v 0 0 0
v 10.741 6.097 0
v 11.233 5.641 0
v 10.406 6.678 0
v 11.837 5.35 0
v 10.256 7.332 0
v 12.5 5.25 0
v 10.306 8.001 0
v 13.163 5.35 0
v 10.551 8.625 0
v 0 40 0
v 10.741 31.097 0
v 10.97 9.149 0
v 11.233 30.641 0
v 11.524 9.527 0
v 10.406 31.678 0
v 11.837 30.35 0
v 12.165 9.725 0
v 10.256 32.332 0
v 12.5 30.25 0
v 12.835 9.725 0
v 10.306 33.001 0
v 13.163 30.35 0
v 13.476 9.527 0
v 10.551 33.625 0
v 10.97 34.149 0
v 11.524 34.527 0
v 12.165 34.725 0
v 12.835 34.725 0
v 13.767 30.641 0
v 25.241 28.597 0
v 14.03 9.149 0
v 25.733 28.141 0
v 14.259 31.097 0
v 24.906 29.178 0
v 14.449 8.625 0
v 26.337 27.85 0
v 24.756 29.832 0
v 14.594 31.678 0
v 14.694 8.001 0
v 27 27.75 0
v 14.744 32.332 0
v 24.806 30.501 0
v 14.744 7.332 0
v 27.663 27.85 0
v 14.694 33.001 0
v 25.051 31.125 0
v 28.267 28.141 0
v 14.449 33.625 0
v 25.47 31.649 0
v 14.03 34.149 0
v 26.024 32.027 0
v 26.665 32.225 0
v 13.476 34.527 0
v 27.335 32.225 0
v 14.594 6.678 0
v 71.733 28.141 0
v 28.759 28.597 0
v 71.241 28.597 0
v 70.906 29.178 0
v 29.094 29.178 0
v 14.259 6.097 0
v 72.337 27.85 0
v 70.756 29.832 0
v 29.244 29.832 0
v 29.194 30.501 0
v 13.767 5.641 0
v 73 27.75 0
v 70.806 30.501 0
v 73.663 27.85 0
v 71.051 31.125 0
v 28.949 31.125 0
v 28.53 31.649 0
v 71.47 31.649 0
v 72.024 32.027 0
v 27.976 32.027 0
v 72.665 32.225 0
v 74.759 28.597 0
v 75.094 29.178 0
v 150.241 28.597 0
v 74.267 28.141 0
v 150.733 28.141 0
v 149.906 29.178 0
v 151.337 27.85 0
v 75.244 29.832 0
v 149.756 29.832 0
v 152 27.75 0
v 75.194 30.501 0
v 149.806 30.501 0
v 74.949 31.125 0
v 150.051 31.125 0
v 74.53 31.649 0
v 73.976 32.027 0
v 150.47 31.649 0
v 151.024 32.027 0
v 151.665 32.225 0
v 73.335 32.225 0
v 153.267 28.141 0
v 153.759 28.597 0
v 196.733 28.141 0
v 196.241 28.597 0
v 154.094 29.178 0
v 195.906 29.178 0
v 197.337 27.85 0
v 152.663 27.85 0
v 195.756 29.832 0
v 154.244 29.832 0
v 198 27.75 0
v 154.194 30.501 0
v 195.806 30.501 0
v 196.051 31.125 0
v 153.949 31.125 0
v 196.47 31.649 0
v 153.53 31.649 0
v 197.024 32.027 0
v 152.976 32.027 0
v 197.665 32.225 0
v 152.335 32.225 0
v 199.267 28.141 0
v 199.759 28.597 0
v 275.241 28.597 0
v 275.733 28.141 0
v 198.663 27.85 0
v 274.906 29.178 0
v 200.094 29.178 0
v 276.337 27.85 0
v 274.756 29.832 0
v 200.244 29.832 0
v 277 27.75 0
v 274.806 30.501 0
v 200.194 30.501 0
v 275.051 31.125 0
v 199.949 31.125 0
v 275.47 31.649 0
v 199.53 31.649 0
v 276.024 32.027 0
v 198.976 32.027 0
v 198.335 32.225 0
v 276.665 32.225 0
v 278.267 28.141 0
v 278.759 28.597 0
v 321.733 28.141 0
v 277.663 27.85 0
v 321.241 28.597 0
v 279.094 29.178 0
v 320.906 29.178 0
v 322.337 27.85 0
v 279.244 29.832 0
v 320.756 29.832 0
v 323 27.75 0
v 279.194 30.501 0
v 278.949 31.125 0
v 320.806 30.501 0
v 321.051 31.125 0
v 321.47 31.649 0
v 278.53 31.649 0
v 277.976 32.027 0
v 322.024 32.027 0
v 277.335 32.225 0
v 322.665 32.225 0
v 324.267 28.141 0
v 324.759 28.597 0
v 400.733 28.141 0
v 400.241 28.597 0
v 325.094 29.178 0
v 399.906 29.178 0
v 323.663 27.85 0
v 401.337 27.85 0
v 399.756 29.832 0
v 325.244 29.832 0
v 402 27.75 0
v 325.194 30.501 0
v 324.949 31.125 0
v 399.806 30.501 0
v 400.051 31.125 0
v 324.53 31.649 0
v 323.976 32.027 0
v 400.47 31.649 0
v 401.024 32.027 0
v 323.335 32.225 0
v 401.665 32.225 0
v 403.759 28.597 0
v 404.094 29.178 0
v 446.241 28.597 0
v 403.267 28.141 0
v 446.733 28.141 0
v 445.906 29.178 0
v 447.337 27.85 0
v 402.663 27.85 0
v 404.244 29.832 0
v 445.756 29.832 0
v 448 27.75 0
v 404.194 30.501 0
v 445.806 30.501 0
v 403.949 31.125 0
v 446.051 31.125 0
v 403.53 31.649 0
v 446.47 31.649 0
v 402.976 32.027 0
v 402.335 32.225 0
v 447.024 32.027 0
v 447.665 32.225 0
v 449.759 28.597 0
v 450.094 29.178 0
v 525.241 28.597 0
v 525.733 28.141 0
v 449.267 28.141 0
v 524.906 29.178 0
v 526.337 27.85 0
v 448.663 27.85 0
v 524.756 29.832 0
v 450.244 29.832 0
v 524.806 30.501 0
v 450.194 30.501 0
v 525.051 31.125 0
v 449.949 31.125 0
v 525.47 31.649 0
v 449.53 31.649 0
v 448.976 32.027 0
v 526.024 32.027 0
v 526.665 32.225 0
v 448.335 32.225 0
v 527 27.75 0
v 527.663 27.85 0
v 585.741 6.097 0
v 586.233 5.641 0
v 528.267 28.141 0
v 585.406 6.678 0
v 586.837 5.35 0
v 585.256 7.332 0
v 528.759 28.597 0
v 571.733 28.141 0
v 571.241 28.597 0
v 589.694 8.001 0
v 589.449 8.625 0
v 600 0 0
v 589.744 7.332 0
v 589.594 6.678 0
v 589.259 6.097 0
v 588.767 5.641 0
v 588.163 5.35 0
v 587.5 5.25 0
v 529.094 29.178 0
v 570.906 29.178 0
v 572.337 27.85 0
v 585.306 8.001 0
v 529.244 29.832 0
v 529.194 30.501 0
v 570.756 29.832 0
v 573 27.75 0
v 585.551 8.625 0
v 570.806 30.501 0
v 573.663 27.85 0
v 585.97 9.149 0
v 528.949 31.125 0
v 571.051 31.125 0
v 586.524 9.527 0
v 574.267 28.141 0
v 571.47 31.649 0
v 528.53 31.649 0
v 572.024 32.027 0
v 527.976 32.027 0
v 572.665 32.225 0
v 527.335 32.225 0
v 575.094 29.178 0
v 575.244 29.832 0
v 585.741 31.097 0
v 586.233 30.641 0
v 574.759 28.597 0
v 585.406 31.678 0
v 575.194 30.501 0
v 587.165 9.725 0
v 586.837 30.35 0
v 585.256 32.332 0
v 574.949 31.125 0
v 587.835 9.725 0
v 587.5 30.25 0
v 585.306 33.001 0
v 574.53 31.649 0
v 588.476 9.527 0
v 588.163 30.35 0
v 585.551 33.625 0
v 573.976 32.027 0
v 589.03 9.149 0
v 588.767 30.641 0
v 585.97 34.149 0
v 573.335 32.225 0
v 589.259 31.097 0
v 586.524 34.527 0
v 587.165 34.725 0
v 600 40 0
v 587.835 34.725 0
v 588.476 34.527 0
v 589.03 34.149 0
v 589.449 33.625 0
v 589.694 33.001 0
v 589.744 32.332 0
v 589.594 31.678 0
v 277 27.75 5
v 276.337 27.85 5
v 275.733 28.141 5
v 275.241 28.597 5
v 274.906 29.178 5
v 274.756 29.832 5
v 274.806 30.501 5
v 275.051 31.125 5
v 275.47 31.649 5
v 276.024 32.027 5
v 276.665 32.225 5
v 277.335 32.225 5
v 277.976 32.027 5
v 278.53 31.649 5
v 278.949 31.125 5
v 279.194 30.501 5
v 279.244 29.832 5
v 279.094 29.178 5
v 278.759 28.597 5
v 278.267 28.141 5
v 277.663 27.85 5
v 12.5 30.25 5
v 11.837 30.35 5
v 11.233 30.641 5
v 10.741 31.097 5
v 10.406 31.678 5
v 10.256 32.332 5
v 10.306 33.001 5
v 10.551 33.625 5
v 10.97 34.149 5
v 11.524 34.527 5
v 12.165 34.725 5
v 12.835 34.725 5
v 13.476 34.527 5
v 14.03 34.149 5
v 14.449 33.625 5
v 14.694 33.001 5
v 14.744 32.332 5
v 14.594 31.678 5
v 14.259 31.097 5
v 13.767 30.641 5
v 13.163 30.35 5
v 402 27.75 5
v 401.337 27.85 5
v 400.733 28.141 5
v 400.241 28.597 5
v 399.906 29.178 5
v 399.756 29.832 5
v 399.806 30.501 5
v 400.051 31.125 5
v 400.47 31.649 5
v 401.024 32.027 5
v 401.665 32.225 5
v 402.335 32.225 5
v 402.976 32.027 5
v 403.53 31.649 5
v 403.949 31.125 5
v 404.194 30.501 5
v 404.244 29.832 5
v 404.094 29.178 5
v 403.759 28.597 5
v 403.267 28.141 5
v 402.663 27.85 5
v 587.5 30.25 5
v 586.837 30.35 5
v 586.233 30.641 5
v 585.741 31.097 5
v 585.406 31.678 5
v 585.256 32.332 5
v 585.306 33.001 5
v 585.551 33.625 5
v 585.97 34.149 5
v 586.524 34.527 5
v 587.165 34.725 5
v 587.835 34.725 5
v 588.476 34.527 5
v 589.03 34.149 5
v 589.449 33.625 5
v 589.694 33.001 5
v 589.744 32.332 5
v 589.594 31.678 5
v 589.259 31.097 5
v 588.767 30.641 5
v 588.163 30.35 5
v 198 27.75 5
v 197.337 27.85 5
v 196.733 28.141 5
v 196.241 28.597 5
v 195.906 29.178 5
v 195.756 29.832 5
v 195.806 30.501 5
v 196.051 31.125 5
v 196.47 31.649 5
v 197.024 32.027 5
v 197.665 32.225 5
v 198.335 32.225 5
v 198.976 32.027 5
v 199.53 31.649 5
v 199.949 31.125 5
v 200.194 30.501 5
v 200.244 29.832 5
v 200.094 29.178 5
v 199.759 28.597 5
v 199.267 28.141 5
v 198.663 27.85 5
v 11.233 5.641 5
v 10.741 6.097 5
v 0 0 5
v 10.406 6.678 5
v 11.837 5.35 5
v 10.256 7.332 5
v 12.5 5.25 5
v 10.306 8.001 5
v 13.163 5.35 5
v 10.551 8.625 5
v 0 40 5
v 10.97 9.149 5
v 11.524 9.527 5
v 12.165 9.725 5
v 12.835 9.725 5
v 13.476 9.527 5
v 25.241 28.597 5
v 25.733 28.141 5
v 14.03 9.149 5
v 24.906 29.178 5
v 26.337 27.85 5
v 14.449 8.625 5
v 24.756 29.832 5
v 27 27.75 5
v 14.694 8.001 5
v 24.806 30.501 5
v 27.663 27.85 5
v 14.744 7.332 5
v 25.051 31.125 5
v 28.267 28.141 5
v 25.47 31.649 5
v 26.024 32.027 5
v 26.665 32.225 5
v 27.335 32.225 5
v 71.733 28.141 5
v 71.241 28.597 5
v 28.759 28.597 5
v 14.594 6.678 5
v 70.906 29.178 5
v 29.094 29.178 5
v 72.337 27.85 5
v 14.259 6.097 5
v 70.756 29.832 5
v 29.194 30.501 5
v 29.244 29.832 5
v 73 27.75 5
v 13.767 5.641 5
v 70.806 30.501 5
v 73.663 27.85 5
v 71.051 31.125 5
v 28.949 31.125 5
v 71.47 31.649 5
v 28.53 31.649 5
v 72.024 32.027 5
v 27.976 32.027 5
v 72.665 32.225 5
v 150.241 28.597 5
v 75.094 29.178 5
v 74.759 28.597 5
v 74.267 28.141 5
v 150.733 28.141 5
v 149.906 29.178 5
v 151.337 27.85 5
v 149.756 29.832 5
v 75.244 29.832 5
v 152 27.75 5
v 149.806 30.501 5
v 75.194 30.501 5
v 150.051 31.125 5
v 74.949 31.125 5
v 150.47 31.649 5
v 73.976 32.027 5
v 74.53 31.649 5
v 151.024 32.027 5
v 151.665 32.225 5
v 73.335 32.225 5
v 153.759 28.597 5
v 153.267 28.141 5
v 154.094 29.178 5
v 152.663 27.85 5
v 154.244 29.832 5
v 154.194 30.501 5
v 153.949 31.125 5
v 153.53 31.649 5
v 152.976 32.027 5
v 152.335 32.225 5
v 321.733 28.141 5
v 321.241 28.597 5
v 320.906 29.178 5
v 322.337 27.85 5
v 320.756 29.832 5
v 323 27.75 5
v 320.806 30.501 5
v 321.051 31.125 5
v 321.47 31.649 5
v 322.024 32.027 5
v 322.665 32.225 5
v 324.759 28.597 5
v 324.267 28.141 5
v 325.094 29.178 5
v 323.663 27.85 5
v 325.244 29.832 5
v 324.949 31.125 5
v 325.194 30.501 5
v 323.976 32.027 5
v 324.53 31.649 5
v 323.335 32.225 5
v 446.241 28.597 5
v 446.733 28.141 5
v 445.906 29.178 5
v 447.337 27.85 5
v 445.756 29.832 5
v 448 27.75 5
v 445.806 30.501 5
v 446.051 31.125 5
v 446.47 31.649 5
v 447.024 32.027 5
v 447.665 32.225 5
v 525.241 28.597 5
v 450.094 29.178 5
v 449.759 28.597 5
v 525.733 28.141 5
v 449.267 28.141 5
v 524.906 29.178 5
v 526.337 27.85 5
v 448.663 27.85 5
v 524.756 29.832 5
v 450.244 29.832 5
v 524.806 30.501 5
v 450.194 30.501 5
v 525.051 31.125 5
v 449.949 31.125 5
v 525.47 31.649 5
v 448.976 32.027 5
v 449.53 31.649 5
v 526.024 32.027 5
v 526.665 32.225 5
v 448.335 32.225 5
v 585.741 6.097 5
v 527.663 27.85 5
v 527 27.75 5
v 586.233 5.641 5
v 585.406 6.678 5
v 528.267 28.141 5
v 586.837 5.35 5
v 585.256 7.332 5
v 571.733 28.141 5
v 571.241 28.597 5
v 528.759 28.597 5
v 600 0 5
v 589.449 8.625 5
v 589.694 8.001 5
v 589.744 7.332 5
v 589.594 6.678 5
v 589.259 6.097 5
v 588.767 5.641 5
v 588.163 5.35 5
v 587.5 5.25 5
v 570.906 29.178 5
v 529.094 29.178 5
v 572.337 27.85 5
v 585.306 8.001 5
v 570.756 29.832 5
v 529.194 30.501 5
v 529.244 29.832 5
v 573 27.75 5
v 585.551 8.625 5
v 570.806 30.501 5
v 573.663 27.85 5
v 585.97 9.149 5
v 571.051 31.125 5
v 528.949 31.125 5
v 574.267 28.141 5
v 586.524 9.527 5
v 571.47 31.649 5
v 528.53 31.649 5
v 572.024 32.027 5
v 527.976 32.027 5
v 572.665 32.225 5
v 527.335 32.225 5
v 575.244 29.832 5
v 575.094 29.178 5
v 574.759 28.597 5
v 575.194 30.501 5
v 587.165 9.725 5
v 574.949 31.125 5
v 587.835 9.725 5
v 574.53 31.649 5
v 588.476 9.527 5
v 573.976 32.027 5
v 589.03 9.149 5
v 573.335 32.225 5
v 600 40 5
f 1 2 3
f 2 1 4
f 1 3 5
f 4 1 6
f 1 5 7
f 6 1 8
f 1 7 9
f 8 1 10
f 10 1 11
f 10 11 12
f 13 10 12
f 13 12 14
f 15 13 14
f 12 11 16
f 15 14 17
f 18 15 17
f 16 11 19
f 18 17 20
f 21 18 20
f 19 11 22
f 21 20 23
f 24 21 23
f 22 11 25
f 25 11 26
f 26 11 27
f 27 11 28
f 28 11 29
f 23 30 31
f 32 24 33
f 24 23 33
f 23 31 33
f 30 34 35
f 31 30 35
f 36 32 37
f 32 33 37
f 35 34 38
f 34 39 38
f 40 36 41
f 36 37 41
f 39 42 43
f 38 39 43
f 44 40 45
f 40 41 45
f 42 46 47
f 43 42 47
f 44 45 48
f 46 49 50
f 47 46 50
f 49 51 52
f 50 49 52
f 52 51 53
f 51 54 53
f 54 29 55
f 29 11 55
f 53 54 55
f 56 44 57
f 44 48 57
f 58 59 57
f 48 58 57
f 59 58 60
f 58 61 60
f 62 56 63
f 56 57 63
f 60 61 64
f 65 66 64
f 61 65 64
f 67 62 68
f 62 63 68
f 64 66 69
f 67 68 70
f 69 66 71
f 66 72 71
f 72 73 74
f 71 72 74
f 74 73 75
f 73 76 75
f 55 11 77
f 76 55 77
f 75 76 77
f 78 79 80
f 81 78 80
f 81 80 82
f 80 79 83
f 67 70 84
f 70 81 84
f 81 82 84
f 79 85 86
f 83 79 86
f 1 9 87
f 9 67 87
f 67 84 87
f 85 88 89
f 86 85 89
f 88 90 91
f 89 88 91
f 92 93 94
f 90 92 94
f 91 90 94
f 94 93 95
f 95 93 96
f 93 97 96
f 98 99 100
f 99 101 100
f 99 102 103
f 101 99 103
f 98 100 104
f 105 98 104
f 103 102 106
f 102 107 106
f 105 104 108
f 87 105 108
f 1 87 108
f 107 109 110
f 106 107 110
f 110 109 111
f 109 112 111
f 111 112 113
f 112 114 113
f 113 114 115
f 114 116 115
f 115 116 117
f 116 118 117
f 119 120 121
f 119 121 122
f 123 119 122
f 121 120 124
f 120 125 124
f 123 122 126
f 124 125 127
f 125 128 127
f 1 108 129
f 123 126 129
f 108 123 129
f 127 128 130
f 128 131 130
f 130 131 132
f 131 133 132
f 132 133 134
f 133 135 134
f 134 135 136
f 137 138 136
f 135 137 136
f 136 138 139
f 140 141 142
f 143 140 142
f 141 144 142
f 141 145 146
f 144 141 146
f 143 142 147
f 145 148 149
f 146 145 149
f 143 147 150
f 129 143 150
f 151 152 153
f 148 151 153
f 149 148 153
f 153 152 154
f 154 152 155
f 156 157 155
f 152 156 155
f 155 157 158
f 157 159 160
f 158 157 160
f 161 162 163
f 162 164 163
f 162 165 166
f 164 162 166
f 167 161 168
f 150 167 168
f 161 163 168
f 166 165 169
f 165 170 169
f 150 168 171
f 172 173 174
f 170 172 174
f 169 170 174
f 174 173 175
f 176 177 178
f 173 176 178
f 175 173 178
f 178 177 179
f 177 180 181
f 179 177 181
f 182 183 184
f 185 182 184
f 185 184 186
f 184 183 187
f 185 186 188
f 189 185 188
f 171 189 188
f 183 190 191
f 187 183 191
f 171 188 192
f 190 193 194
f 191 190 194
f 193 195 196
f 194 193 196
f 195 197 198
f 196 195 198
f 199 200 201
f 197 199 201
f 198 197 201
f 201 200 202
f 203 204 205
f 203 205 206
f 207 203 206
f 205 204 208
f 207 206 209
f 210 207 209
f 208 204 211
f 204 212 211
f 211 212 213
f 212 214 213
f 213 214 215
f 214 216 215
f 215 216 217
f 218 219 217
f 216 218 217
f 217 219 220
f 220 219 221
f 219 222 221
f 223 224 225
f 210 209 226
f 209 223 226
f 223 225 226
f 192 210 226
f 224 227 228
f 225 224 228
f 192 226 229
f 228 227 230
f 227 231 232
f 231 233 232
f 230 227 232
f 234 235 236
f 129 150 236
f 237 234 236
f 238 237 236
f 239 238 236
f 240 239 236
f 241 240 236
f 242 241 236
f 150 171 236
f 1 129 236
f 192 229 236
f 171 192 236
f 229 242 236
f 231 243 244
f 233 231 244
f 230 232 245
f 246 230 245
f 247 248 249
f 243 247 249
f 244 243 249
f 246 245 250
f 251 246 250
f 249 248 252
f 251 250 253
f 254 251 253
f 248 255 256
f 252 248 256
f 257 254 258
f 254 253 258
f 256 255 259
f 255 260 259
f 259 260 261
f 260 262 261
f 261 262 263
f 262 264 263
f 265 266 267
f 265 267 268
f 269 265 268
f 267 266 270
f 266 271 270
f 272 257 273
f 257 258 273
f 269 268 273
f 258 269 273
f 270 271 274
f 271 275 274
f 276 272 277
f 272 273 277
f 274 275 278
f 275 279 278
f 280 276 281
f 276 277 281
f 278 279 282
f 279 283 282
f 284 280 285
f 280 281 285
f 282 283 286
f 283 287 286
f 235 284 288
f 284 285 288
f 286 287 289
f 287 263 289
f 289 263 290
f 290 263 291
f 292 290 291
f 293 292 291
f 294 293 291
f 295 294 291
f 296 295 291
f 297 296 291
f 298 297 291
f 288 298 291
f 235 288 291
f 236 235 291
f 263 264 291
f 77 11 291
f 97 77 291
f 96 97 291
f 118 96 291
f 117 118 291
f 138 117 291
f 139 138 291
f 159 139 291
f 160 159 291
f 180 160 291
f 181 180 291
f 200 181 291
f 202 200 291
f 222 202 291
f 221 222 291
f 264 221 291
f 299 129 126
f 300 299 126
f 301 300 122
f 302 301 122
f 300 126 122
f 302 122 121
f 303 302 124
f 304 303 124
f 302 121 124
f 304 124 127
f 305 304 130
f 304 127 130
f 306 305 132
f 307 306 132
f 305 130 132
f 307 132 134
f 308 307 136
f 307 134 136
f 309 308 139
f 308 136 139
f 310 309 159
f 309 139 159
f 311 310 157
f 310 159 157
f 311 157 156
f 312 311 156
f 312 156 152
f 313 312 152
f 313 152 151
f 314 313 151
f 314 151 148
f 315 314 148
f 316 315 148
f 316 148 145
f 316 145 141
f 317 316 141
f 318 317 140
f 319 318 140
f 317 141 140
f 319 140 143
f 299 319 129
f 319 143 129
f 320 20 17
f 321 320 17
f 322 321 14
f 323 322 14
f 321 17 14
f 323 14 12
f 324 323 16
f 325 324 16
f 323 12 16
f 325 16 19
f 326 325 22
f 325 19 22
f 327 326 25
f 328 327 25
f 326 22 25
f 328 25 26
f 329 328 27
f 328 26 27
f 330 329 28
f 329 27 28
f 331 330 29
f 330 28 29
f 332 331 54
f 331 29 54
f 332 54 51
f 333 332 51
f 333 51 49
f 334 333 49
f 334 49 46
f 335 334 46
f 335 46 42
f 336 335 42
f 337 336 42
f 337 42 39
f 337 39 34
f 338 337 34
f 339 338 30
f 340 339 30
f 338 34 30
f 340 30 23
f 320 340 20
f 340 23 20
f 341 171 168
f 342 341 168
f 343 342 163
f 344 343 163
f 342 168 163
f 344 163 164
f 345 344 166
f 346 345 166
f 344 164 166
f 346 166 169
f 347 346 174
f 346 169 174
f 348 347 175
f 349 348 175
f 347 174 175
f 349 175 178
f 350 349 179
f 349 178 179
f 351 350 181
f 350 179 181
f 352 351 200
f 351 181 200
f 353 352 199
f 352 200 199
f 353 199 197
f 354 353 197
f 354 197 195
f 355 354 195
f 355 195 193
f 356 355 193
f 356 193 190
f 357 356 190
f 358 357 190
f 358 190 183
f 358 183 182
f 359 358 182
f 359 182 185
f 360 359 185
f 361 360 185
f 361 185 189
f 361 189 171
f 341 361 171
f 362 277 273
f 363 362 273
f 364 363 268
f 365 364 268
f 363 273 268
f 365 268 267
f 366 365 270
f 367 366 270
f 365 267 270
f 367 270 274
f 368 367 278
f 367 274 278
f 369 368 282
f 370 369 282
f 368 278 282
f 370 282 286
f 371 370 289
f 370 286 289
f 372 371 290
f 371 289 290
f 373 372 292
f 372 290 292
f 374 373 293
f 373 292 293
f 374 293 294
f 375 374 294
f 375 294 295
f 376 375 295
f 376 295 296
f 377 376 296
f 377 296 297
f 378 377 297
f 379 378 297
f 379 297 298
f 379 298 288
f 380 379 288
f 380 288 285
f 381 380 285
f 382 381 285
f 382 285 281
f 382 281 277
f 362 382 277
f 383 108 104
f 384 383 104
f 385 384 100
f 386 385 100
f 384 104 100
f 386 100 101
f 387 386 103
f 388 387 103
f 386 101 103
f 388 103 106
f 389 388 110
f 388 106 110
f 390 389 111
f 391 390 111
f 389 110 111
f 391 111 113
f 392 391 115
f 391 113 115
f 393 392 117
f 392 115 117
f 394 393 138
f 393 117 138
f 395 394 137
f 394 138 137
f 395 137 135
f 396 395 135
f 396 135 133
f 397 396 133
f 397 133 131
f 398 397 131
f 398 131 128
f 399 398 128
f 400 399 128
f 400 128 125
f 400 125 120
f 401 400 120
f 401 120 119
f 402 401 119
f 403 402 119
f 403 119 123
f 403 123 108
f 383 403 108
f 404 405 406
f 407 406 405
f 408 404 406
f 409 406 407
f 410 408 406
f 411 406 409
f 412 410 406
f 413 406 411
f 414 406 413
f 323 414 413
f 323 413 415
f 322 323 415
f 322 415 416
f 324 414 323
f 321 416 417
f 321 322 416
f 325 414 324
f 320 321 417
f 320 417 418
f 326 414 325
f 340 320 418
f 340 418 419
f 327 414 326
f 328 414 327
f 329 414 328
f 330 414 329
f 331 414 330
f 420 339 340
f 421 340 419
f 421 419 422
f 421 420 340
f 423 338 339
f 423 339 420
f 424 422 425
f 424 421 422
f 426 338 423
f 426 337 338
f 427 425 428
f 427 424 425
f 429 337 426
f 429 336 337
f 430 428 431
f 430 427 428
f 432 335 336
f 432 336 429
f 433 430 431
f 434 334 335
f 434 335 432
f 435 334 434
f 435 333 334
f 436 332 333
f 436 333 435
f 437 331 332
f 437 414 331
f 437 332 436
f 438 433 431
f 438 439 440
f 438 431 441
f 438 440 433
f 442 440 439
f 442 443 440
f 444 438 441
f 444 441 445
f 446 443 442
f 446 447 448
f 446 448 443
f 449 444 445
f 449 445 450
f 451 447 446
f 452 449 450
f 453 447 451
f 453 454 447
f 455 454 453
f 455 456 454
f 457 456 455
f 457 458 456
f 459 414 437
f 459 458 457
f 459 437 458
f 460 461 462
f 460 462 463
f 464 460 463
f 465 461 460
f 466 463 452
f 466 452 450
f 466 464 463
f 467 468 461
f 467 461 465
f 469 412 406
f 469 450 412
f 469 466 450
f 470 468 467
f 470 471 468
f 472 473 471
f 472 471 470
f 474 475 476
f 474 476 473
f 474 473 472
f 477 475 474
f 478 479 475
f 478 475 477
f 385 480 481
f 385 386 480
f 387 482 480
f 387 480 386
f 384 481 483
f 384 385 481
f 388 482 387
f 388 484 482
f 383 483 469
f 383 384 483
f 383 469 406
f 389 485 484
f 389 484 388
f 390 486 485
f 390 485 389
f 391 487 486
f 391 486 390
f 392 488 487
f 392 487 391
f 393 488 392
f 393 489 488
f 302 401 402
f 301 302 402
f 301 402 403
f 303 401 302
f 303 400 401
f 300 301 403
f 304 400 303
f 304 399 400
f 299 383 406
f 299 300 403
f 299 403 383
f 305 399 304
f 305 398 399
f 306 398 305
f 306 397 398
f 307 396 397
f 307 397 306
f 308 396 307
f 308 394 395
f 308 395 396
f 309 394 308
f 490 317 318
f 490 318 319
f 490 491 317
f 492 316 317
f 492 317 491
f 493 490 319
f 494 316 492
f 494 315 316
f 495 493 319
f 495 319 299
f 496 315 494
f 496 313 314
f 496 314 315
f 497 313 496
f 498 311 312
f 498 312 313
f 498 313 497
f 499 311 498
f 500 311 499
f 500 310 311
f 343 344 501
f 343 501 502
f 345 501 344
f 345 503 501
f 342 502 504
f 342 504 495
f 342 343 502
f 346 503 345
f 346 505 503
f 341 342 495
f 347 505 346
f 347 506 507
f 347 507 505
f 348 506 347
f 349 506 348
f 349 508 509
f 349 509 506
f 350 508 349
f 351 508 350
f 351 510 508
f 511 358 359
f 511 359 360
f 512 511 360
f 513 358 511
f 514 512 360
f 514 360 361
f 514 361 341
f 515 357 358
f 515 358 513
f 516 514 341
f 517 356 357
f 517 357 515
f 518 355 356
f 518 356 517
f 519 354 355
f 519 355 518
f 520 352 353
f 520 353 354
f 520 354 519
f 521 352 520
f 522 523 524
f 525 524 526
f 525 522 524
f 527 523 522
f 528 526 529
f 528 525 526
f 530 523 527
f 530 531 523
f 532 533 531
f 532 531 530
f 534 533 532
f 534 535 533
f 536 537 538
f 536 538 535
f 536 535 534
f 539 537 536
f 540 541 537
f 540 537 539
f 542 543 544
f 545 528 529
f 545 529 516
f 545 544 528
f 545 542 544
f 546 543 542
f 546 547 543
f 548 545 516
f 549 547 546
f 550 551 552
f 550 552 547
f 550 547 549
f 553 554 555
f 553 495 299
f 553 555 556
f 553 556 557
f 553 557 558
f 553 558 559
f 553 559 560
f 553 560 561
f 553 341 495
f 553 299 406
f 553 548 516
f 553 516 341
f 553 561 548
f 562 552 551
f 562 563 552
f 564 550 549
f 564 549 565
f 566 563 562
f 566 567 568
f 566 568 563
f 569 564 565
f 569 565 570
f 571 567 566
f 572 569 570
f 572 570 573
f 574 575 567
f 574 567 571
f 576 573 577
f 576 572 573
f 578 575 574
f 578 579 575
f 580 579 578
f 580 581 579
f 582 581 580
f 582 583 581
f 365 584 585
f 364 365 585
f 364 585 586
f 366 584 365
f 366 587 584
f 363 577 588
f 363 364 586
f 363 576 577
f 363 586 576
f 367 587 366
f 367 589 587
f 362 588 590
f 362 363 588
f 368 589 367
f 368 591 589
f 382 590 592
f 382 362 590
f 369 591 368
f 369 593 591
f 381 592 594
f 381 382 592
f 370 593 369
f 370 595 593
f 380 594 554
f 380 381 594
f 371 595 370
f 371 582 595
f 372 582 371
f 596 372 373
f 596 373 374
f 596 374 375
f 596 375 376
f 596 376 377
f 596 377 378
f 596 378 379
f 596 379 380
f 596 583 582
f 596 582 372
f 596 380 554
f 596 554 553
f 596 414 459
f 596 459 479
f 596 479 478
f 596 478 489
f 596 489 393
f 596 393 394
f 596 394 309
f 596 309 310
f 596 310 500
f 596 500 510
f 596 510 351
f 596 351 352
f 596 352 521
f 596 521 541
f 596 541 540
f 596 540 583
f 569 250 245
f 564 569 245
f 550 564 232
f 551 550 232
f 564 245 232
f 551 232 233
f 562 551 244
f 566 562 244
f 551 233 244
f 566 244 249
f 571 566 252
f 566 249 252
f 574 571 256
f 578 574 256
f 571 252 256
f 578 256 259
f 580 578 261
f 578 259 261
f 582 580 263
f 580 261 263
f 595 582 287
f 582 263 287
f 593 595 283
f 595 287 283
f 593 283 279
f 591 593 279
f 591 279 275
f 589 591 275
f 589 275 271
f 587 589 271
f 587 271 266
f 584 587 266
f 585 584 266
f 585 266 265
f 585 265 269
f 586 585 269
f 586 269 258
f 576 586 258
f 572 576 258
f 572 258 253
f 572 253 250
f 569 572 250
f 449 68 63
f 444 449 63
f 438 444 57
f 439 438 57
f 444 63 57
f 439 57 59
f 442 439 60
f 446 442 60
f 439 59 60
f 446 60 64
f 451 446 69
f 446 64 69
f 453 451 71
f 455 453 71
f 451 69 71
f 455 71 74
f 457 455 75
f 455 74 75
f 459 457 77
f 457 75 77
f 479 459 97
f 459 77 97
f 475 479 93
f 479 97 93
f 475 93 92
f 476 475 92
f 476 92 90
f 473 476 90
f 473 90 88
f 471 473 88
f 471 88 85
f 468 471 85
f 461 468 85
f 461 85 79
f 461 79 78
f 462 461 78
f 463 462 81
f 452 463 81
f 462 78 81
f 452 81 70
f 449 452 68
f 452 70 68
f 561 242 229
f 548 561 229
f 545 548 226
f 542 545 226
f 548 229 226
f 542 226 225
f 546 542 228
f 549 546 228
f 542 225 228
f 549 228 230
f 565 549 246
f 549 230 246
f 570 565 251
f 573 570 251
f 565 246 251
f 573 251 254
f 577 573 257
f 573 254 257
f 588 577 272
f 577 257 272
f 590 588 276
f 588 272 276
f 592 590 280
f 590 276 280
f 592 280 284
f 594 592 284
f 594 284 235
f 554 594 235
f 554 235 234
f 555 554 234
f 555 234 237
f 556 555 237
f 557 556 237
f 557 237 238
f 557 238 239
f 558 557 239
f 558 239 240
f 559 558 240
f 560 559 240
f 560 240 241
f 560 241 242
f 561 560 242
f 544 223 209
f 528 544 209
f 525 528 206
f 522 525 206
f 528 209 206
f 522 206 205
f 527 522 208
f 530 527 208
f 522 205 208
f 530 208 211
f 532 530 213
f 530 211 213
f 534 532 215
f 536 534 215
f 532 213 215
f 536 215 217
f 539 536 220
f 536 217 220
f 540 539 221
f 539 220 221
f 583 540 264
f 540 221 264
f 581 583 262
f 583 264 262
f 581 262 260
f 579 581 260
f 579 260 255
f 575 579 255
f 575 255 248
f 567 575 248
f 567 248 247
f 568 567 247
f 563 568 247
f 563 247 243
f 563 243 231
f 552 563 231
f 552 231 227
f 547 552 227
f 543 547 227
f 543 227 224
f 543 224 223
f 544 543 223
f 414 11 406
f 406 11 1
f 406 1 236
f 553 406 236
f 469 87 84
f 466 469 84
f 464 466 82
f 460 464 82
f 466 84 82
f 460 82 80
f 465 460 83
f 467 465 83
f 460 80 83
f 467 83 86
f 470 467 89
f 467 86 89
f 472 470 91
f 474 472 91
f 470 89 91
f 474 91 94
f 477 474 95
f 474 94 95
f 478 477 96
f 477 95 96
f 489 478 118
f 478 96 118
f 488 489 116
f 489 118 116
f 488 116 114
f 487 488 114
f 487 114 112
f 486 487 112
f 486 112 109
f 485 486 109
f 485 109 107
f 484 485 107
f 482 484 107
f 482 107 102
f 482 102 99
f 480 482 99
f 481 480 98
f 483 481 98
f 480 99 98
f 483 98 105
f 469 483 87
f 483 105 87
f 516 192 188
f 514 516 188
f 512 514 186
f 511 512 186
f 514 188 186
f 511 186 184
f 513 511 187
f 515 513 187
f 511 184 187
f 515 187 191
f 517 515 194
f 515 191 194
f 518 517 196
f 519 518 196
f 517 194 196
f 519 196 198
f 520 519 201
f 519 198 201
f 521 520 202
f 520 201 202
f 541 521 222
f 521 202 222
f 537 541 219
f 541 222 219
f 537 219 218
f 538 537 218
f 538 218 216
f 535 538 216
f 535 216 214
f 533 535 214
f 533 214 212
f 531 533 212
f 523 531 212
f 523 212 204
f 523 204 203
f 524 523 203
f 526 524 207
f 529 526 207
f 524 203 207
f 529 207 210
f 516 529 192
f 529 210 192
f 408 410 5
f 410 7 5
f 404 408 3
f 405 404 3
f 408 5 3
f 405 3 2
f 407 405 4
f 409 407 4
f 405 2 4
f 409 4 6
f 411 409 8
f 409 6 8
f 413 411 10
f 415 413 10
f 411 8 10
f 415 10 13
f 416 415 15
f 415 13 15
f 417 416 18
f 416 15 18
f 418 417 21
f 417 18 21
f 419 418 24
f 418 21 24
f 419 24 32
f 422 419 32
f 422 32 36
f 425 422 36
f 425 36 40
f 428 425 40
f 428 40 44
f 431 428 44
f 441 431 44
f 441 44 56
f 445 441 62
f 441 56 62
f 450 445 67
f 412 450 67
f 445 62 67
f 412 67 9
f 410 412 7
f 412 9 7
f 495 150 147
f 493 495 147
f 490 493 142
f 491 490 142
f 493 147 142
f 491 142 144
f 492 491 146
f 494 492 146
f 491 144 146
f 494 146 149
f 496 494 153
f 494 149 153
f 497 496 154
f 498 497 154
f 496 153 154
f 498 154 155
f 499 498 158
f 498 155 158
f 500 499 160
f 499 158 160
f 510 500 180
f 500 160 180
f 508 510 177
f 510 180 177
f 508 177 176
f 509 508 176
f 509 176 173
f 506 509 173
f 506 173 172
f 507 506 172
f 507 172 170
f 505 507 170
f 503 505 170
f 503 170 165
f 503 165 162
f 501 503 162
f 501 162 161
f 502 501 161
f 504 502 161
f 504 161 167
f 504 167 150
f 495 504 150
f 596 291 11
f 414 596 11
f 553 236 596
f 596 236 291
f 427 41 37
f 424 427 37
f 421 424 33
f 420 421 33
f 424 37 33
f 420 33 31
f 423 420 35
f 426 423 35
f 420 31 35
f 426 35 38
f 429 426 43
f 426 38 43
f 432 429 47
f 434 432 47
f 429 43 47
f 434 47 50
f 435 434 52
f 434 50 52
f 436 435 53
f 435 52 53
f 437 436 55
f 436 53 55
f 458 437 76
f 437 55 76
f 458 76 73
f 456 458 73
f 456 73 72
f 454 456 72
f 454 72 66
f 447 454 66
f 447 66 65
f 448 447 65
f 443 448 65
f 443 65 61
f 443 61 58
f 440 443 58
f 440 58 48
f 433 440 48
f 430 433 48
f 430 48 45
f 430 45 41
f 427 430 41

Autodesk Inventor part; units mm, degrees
ref_plane "YZ Plane" through (0, 0, 0) normal (1, 0, 0) x (0, 1, 0)
ref_plane "XZ Plane" through (0, 0, 0) normal (0, 1, 0) x (-1, 0, 0)
ref_plane "XY Plane" through (0, 0, 0) normal (0, 0, 1) x (1, 0, 0)
sketch "Sketch1" plane through (0, 0, 0) normal (0, 0, 1) x (1, 0, 0)
  line L0 (0, 0) -> (600, 0)
  line L1 (600, 0) -> (600, 40)
  line L2 (600, 40) -> (0, 40)
  line L3 (0, 40) -> (0, 0)
  dimension "d0" = 600
  dimension "d1" = 40
extrude "Extrusion1" add sketch "Sketch1" along normal blind 5
sketch "Sketch2" plane through (0, 0, 5) normal (0, 0, 1) x (1, 0, 0)
  line L0 (600, 40) -> (0, 40) projected
  line L1 (0, 40) -> (0, 0) projected
  line L2 (0, 0) -> (600, 0) projected
  line L3 (600, 0) -> (600, 40) projected
  point P0 (12.5, 32.5)
  point P1 (12.5, 7.5)
  point P2 (587.5, 32.5)
  point P3 (587.5, 7.5)
  dimension "d4" = 7.5
  dimension "d5" = 12.5
  dimension "d6" = 7.5
  dimension "d7" = 12.5
hole "Hole1" at (12.5, 32.5, 5) at (12.5, 7.5, 5) at (587.5, 32.5, 5) at (587.5, 7.5, 5) direction (0, 0, -1) diameter 4.5 end through all clearance for "Flat Head Machine Screw" size "M4" standard "Ansi Metric M Profile"
sketch "Sketch3" plane through (0, 0, 5) normal (0, 0, 1) x (1, 0, 0)
  line L0 (600, 40) -> (0, 40) projected
  line L1 (0, 40) -> (0, 0) projected
  point P0 (27, 30)
  point P1 (73, 30)
  dimension "d15" = 46
  dimension "d16" = 10
  dimension "d17" = 27
hole "Hole2" at (27, 30, 5) at (73, 30, 5) direction (0, 0, -1) diameter 4.5 end through all clearance for "Flat Head Machine Screw" size "M4" standard "Ansi Metric M Profile"
pattern_linear "Rectangular Pattern1" count 5 spacing 125 along (1, 0, 0) of "Hole2"
equation "\"d6\" = d4"
equation "\"d7\" = d5"
properties part number "Top_End Piece 2" material "Wood (Birch)"
